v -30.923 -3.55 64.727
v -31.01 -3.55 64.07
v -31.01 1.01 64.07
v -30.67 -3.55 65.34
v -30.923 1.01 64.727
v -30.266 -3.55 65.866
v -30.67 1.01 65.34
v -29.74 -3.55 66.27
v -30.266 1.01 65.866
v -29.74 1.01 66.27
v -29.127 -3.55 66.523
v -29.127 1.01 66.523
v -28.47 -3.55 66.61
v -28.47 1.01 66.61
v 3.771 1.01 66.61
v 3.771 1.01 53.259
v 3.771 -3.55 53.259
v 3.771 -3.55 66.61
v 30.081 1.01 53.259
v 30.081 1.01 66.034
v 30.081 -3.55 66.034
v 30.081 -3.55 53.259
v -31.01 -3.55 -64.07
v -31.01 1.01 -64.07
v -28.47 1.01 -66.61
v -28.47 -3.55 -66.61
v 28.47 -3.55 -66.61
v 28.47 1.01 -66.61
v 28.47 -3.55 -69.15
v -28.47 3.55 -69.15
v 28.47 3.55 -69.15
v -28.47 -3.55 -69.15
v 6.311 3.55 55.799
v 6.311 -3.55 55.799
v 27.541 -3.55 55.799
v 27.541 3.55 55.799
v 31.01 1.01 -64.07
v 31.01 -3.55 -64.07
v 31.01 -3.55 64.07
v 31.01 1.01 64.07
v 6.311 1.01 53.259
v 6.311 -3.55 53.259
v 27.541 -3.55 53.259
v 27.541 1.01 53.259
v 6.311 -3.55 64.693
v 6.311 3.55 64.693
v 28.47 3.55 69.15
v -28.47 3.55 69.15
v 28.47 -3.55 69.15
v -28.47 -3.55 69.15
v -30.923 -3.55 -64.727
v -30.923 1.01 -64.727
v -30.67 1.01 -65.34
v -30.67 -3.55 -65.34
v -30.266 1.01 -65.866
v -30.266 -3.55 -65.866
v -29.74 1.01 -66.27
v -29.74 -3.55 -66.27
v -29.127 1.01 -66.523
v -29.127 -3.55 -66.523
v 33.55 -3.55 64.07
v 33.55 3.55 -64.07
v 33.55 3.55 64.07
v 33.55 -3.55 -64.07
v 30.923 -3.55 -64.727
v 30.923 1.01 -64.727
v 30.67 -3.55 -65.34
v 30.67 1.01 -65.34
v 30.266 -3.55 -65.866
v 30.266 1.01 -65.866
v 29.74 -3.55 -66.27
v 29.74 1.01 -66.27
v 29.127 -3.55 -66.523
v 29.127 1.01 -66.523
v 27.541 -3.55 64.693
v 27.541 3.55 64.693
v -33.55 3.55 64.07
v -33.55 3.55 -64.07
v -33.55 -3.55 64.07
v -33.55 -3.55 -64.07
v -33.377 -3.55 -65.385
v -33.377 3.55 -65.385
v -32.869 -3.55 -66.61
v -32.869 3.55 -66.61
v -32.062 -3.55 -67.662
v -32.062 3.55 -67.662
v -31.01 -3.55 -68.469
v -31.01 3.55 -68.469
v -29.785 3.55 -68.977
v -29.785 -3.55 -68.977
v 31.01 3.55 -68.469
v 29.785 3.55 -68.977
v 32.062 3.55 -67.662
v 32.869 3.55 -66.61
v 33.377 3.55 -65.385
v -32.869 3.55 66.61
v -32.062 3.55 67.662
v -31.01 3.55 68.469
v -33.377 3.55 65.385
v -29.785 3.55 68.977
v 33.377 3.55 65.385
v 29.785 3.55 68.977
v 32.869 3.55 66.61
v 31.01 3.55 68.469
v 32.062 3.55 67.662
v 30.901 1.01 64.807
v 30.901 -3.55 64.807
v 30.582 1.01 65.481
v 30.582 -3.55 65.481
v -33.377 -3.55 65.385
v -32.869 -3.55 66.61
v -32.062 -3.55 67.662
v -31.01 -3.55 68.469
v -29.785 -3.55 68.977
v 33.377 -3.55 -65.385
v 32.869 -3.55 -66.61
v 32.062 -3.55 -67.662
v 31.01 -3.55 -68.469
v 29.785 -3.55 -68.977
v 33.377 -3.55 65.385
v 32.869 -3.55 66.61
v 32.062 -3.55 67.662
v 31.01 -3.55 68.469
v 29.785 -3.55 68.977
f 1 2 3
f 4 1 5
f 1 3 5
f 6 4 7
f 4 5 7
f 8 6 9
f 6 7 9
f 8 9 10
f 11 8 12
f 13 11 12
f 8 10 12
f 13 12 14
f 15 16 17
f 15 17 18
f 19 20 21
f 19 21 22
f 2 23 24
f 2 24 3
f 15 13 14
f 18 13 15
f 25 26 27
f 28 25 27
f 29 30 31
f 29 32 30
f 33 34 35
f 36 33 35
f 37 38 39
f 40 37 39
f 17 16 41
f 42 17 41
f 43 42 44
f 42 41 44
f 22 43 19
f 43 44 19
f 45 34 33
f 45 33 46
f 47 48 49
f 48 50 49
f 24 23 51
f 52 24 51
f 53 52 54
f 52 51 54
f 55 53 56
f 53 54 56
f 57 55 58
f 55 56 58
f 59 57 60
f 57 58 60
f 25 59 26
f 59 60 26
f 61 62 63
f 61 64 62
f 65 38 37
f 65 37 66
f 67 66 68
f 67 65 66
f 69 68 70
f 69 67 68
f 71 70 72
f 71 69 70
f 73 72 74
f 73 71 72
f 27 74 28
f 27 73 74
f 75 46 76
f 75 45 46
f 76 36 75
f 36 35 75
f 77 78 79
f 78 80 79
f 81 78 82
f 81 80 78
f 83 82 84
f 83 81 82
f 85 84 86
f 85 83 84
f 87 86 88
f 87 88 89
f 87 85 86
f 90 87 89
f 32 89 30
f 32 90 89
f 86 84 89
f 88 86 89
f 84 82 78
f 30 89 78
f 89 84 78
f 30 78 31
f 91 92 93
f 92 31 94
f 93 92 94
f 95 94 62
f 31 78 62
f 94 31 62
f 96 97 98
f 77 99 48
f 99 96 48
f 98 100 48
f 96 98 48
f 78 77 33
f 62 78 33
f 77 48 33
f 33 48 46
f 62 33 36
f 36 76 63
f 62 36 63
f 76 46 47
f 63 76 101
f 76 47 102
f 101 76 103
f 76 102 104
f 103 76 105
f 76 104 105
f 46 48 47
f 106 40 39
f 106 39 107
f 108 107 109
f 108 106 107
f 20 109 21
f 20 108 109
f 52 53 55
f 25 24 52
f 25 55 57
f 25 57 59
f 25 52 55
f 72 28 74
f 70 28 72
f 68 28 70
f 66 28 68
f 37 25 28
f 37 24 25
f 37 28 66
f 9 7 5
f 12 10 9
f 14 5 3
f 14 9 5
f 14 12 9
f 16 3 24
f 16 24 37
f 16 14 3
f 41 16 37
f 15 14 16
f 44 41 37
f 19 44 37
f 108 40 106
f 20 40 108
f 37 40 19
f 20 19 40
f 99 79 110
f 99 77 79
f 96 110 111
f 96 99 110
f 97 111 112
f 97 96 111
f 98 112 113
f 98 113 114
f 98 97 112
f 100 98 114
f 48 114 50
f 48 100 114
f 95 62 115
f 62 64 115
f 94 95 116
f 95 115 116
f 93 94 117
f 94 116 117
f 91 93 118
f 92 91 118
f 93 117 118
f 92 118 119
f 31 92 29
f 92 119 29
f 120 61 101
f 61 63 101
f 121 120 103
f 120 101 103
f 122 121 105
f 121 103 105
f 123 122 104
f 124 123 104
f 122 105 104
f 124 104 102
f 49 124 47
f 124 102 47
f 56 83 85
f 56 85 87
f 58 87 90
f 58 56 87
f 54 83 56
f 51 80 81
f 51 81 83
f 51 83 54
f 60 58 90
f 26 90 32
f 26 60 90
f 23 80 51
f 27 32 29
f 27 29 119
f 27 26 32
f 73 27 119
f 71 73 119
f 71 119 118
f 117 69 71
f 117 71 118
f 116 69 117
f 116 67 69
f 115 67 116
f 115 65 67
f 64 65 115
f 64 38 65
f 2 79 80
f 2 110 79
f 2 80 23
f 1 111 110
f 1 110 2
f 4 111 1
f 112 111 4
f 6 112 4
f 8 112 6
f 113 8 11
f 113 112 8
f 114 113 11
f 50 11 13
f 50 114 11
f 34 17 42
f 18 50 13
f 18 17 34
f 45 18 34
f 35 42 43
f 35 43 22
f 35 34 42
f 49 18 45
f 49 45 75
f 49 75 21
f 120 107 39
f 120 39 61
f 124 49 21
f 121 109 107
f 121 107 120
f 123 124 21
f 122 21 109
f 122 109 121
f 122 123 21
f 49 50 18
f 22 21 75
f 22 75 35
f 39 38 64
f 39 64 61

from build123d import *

# Parameters (mm, degrees)
F0_W        = 67.1
F0_H        = 138.3
F0_W_2      = 21.2295074016
F0_H_2      = 8.8934414089
F1_DEPTH    = 3.55
F2_R        = 5.08
F3_T        = 2.54
F3_T3_DEPTH = 12.18


# Not quite as in the source:
# - a shell that OpenCascade refuses in one call is made with other operations: the cavity is built on its own and cut out


with BuildPart() as f1:
    # F0 (on Front) → F1 (new body, symmetric)
    with BuildSketch(Plane.XZ):
        Rectangle(F0_W, F0_H)
        with Locations((16.9262299314, 60.2459032089)):
            Rectangle(F0_W_2, F0_H_2, mode=Mode.SUBTRACT)
    extrude(amount=F1_DEPTH, both=True)

    # F2
    f2_edges = [f1.edges().sort_by_distance(p)[0] for p in [
        (33.55, 0, 69.15),
        (-33.55, 0, 69.15),
        (33.55, 0, -69.15),
        (-33.55, 0, -69.15),
    ]]
    fillet(f2_edges, radius=F2_R)

    # F3: shell of thickness 2.54, made by hand


with BuildPart() as f3_core1:
    # F3_t2: copy of F1
    add(f1.part)

    # the walls: a layer under each face that stays
    f3_faces = [f3_core1.faces().sort_by_distance(p)[0] for p in [
        (0, 0, 69.15),
        (0, 3.55, 0),
        (32.0621024484, 0, 67.6621024484),
        (-32.0621024484, 0, 67.6621024484),
        (33.55, 0, 0),
        (-33.55, 0, 0),
        (32.0621024484, 0, -67.6621024484),
        (-32.0621024484, 0, -67.6621024484),
        (0, 0, -69.15),
        (6.3114762306, 0, 60.2459032089),
        (16.9262299314, 0, 64.6926239133),
        (27.5409836322, 0, 60.2459032089),
        (16.9262299314, 0, 55.7991825044),
    ]]
    thicken(f3_faces, amount=-F3_T, mode=Mode.SUBTRACT)

    # F3_s4 → F3_t3 (cut)
    with BuildSketch(Plane.XZ.offset(-6.09)):
        Polygon((6.3368762306, 64.6672239133), (3.7714762306, 64.6926239133), (3.7714762306, 67.2326239133), (6.3114762306, 67.2326239133), align=None)
        Polygon((6.3368762306, 55.8245825044), (3.7714762306, 55.7991825044), (3.7714762306, 53.2591825044), (6.3114762306, 53.2591825044), align=None)
        Polygon((27.5155836322, 64.6672239133), (27.5409836322, 67.2326239133), (30.0809836322, 67.2326239133), (30.0809836322, 64.6926239133), align=None)
        Polygon((27.5155836322, 55.8245825044), (30.0809836322, 55.7991825044), (30.0809836322, 53.2591825044), (27.5409836322, 53.2591825044), align=None)
    extrude(amount=F3_T3_DEPTH, mode=Mode.SUBTRACT)


with BuildPart() as f1_1:
    add(f1.part)

    # what is left inside the walls is the cavity
    f3_cavity = [f3_core1.part.solids().sort_by_distance(p)[0] for p in [
        (0, -3.5246, -22.203333),
    ]]
    add(f3_cavity, mode=Mode.SUBTRACT)


solid = f1_1.part
